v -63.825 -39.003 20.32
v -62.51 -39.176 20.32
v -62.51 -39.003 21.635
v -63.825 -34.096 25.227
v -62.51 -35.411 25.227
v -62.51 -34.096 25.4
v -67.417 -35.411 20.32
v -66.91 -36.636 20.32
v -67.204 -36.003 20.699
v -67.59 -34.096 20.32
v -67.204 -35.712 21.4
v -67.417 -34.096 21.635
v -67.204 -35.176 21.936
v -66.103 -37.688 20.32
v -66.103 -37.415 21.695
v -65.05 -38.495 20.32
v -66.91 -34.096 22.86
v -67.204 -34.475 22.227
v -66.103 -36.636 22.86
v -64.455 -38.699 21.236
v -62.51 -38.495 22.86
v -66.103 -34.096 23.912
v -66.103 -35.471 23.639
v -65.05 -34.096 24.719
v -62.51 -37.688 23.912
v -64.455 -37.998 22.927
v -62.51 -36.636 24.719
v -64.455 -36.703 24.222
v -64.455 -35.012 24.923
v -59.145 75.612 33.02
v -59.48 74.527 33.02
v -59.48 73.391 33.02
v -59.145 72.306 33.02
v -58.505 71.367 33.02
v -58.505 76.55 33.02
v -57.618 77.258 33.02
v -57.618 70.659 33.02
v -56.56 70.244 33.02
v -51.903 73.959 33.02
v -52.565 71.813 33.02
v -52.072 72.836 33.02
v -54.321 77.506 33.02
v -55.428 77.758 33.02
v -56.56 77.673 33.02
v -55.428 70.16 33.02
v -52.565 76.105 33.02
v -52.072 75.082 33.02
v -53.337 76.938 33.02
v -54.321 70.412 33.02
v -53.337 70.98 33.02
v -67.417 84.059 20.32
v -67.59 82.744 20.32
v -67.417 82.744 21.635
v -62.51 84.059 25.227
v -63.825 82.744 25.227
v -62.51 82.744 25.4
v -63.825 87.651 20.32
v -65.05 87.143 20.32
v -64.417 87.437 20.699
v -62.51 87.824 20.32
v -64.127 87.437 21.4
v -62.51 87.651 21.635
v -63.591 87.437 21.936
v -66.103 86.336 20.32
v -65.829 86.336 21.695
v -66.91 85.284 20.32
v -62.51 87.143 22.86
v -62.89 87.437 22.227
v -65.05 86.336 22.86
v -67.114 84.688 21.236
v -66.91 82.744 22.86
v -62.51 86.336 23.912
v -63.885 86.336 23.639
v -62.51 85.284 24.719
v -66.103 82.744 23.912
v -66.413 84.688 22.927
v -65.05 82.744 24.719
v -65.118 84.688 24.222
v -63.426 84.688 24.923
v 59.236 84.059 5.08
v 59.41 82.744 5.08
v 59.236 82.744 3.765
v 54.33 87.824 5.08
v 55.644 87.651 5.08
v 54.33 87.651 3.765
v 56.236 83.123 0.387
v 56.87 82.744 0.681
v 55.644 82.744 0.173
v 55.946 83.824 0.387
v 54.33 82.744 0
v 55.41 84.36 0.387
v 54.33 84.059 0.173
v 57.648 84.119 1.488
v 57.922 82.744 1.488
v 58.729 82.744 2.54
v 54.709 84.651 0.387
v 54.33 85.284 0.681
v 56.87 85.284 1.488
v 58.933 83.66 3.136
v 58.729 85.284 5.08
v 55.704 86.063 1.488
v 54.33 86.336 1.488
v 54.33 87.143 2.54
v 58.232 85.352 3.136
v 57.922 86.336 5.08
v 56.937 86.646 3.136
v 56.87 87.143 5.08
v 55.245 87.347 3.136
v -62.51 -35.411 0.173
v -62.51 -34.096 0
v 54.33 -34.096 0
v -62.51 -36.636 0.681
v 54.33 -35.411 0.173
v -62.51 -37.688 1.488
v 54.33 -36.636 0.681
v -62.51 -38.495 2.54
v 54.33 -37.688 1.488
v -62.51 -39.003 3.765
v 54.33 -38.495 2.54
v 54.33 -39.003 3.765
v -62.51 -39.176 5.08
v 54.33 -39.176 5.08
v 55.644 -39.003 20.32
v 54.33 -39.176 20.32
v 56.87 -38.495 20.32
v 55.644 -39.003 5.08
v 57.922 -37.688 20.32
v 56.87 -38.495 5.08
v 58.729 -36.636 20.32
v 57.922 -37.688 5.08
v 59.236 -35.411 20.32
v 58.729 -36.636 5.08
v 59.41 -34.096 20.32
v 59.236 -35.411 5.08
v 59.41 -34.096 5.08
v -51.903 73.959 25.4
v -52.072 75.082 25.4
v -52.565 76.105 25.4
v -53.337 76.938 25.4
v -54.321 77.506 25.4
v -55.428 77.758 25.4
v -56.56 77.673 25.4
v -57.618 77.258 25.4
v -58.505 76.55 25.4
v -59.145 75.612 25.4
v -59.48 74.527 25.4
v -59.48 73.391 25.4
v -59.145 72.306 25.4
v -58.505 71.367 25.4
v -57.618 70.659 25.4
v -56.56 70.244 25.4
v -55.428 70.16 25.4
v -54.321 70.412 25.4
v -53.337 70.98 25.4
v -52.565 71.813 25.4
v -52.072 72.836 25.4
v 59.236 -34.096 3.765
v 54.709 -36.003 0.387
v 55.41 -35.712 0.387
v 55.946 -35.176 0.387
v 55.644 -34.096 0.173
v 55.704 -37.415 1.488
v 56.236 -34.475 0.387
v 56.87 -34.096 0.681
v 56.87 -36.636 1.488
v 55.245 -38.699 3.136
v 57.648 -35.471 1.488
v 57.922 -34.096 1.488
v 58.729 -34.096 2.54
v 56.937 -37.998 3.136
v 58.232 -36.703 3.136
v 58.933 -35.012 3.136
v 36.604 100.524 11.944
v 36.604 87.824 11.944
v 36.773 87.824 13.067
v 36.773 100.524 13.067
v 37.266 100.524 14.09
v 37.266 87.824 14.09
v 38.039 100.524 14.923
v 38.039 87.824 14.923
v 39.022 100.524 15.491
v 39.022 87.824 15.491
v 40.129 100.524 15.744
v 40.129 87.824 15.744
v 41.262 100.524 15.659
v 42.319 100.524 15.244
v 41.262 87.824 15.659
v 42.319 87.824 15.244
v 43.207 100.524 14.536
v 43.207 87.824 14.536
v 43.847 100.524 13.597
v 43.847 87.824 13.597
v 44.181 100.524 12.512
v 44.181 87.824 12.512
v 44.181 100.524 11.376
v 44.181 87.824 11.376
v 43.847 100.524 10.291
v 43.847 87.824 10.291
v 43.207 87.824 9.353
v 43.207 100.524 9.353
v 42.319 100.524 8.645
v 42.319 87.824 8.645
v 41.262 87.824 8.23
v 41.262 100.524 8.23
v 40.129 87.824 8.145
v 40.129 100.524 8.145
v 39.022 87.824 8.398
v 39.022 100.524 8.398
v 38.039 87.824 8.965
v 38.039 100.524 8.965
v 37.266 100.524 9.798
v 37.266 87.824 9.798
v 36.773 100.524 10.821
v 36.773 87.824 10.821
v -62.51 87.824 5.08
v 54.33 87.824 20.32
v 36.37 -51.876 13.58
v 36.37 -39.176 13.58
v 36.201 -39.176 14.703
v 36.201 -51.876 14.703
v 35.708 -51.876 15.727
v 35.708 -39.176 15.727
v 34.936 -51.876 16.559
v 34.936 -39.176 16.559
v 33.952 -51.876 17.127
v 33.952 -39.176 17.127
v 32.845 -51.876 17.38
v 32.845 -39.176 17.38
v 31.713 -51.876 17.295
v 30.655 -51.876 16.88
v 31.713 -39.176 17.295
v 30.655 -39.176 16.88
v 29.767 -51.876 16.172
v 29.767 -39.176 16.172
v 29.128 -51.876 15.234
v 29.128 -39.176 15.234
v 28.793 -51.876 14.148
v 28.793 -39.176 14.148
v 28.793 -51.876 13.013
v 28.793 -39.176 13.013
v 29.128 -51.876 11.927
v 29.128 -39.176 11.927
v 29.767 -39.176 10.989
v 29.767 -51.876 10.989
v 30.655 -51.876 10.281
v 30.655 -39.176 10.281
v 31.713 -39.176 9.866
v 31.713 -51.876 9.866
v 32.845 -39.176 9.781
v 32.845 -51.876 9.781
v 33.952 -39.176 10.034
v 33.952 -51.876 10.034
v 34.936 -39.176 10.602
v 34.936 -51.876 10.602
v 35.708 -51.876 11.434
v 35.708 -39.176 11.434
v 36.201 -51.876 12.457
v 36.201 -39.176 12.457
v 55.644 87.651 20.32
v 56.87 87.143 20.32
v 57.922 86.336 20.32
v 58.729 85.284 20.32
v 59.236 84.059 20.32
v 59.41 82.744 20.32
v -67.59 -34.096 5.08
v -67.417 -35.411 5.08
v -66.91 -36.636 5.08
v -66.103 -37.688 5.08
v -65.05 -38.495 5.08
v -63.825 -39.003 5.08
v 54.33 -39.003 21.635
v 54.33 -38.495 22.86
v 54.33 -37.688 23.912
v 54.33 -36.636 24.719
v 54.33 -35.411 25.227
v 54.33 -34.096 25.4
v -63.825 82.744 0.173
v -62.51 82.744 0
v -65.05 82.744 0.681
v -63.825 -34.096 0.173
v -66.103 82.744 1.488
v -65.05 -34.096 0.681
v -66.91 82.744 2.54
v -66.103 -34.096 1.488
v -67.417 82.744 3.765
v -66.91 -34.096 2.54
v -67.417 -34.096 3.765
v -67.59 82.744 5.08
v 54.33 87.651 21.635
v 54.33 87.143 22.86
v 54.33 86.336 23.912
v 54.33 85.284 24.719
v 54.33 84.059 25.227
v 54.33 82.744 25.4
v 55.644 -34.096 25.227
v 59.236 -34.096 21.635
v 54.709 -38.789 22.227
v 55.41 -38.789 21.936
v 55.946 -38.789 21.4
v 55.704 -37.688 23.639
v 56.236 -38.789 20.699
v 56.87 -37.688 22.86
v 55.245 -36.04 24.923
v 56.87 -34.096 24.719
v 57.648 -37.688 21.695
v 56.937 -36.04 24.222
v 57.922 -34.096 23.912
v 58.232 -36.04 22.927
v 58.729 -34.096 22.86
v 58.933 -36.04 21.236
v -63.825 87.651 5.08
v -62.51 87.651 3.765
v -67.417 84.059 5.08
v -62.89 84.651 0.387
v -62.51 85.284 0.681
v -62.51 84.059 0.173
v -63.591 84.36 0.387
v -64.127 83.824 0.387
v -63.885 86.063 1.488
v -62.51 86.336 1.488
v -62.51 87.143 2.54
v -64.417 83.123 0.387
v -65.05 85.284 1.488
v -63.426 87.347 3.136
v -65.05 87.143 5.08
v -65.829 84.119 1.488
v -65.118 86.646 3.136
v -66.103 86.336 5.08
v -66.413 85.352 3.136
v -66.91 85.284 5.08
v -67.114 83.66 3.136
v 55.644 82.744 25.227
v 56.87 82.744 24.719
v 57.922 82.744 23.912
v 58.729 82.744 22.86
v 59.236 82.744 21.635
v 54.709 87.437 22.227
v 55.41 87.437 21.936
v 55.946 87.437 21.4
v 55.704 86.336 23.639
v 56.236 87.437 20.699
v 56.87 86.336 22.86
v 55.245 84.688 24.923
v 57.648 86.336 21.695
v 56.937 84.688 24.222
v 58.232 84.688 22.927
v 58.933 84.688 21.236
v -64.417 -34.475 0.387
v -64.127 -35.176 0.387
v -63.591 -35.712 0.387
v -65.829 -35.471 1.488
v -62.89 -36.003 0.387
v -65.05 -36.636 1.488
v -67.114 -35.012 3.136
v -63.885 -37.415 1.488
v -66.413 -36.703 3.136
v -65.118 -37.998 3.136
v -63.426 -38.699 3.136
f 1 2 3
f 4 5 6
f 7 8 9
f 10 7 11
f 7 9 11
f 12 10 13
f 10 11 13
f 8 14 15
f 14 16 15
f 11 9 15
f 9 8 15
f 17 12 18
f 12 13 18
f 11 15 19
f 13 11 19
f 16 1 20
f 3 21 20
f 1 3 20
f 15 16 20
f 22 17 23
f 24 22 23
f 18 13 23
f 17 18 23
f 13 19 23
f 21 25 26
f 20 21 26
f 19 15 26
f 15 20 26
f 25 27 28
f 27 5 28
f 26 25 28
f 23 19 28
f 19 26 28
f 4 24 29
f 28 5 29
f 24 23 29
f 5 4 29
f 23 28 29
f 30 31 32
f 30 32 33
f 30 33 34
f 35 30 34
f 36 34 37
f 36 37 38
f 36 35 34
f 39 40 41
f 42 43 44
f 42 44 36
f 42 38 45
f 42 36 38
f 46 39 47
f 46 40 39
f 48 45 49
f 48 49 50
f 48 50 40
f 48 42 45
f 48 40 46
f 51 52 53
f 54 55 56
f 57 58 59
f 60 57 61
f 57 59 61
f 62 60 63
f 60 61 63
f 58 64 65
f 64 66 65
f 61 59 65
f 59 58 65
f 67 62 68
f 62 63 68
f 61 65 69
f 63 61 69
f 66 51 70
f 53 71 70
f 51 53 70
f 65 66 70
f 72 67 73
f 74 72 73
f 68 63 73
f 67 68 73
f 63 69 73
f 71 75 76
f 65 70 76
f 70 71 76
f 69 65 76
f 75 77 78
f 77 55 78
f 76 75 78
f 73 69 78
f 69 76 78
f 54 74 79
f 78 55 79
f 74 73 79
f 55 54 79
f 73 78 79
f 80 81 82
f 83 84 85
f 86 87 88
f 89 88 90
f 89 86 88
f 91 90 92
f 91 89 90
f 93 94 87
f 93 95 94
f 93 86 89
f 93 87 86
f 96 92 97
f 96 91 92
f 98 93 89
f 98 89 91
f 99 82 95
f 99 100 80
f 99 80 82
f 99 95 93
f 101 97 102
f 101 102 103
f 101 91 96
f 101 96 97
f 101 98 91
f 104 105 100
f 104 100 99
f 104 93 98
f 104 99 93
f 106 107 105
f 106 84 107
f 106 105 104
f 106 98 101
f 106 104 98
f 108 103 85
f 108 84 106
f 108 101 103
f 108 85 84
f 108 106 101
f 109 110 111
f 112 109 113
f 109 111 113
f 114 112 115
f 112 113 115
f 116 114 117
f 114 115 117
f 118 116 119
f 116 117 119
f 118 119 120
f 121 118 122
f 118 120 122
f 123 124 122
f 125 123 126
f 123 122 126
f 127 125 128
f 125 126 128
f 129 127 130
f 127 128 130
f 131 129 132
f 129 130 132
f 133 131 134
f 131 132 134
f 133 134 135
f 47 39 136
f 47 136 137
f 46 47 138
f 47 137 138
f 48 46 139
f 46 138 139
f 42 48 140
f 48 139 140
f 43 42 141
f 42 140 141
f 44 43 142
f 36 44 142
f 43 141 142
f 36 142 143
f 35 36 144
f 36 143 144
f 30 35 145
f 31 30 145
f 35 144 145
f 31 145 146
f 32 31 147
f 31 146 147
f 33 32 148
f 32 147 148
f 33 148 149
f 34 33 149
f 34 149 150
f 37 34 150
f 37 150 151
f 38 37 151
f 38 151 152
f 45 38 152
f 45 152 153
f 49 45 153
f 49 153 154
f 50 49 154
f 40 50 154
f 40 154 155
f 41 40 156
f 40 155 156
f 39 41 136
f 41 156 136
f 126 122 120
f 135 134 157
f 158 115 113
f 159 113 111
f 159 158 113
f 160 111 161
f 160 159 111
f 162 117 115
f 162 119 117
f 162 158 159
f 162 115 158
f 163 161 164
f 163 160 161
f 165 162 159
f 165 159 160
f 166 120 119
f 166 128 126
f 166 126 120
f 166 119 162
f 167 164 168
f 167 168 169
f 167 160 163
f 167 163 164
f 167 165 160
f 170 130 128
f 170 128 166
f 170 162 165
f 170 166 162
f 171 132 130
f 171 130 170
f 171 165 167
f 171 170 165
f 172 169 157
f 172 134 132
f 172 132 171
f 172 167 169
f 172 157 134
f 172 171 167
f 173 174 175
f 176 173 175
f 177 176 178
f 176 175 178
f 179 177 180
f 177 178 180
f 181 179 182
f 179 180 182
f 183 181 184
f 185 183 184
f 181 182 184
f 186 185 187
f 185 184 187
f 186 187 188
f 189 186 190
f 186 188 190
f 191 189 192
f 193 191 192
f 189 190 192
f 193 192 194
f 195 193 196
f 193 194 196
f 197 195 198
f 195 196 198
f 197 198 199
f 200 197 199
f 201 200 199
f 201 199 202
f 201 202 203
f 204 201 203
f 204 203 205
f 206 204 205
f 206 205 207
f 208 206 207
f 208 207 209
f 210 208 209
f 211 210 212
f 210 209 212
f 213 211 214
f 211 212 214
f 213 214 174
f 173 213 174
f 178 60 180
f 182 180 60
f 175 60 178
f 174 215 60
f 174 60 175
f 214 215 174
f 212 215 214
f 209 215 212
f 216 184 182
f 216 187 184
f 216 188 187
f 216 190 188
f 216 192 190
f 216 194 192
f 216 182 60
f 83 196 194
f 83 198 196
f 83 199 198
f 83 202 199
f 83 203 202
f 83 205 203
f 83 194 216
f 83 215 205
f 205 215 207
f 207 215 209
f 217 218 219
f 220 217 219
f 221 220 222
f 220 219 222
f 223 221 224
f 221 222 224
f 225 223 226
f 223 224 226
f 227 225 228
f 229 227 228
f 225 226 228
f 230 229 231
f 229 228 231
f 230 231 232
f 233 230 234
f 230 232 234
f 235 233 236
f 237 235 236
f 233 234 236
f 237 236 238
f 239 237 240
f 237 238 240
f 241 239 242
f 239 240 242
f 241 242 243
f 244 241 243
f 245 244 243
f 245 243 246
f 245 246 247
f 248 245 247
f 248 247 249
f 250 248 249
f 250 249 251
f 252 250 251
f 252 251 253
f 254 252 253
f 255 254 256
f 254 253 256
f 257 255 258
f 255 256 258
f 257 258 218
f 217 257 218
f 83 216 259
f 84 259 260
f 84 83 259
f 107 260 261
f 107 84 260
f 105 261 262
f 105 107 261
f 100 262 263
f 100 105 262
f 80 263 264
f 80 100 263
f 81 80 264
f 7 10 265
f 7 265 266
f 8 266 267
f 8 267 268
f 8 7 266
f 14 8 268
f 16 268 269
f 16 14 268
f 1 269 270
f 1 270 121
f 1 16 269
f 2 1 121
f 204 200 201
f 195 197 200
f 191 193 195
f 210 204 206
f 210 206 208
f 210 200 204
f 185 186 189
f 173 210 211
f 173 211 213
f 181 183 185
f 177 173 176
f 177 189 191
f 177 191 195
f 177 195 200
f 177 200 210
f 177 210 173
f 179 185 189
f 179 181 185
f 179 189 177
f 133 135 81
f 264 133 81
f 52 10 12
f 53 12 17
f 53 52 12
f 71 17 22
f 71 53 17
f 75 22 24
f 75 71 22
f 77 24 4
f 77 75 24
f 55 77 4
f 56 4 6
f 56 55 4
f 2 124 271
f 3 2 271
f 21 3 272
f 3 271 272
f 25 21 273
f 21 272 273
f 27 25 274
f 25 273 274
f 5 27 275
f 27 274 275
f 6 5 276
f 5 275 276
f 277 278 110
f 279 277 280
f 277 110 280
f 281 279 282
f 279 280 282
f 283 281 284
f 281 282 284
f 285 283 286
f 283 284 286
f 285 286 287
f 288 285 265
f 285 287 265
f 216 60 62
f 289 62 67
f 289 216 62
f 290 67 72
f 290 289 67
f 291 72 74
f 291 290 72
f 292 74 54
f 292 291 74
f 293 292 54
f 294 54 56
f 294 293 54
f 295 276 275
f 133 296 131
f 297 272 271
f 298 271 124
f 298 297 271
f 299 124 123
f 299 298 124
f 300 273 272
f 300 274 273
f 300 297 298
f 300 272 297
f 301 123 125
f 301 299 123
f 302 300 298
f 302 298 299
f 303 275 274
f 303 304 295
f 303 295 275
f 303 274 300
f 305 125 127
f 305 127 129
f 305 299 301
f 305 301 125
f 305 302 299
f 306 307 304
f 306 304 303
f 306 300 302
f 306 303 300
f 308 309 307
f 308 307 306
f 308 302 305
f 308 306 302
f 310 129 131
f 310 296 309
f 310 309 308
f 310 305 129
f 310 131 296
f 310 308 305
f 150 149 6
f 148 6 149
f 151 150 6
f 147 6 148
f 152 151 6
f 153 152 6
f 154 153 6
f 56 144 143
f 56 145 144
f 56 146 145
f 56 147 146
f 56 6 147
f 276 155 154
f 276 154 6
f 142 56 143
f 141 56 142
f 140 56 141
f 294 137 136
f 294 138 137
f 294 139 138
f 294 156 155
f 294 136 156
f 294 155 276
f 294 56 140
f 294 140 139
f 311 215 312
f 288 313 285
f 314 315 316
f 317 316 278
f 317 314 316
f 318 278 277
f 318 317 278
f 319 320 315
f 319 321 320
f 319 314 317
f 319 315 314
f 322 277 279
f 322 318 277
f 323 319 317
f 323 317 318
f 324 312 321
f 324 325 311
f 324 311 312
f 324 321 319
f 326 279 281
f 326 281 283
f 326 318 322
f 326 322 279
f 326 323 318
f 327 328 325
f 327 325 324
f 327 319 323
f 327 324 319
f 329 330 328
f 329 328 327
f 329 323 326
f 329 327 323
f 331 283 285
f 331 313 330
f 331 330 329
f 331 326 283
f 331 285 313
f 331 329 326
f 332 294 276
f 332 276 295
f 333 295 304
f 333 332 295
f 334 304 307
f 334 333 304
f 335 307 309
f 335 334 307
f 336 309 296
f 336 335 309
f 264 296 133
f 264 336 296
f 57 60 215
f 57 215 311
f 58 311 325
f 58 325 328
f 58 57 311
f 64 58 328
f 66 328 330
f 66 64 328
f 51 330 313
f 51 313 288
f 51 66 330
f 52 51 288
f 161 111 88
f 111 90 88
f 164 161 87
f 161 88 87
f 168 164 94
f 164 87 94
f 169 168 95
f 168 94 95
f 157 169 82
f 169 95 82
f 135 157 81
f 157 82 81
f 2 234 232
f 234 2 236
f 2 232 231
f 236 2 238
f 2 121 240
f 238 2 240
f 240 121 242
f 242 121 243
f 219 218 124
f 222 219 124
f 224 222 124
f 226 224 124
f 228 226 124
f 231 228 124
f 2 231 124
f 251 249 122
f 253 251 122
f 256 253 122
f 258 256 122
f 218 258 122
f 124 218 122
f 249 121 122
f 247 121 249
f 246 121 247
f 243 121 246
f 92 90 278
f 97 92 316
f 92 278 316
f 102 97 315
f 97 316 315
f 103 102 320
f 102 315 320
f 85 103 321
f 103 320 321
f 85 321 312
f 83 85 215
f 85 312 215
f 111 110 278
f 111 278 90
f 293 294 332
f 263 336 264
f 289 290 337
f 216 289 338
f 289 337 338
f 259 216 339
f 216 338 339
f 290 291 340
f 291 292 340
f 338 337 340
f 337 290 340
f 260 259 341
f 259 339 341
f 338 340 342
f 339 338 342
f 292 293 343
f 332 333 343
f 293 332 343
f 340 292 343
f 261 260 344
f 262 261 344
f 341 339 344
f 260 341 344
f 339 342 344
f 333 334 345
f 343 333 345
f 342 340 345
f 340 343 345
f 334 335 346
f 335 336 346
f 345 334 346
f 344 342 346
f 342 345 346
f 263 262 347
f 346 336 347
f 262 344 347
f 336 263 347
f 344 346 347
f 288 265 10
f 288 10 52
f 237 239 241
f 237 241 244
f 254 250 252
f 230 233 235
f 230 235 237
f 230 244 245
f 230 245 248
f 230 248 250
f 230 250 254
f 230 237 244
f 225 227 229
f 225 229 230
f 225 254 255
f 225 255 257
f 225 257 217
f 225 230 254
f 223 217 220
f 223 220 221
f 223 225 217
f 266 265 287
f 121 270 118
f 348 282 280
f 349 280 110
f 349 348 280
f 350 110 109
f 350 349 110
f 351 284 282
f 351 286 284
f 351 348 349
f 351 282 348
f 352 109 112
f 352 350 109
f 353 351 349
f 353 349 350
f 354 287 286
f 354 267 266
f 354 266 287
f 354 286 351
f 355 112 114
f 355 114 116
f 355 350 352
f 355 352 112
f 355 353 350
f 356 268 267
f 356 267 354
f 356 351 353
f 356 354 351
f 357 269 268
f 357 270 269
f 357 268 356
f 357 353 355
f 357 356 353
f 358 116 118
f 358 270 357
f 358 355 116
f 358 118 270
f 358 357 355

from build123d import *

# Parameters (mm, degrees)
F0_W      = 127
F0_H      = 127
F1_DEPTH  = 25.4
F2_R      = 3.81
F3_DEPTH  = 7.62
F4_R      = 5.08
F5_R      = 5.08
F6_R      = 5.08
F7_R      = 5.08
F8_R      = 5.08
F9_R      = 3.81
F10_DEPTH = 12.7
F11_R     = 3.81
F12_DEPTH = 12.7


with BuildPart() as f1:
    # F0 (on Top) → F1 (new body)
    with BuildSketch(Plane.XY):
        with Locations((-4.09049, 24.324038)):
            Rectangle(F0_W, F0_H)
    extrude(amount=F1_DEPTH)

    # F2 (on face) → F3 (join)
    with BuildSketch(Plane.XY.offset(25.4)):
        with Locations((-55.712551, 73.958889)):
            Circle(F2_R)
    extrude(amount=F3_DEPTH)

    # F4
    f4_edges = [f1.edges().sort_by_distance(p)[0] for p in [
        (59.40951, 24.324038, 25.4),
    ]]
    fillet(f4_edges, radius=F4_R)

    # F5
    f5_edges = [f1.edges().sort_by_distance(p)[0] for p in [
        (-6.63049, -39.175962, 25.4),
    ]]
    fillet(f5_edges, radius=F5_R)

    # F6
    f6_edges = [f1.edges().sort_by_distance(p)[0] for p in [
        (-67.59049, 26.864038, 25.4),
    ]]
    fillet(f6_edges, radius=F6_R)

    # F7
    f7_edges = [f1.edges().sort_by_distance(p)[0] for p in [
        (-4.09049, 87.824038, 25.4),
    ]]
    fillet(f7_edges, radius=F7_R)

    # F8
    f8_edges = [f1.edges().sort_by_distance(p)[0] for p in [
        (59.40951, 24.324038, 0),
    ]]
    fillet(f8_edges, radius=F8_R)

    # F9 (on face) → F10 (join)
    with BuildSketch(Plane.XZ.offset(39.175962)):
        with Locations((32.560311, 13.580429)):
            Circle(F9_R)
    extrude(amount=F10_DEPTH)

    # F11 (on face) → F12 (join)
    with BuildSketch(Plane(origin=(0, 87.824038, 0), x_dir=(-1, 0, 0), z_dir=(0, 1, 0))):
        with Locations((-40.414046, 11.944233)):
            Circle(F11_R)
    extrude(amount=F12_DEPTH)


solid = f1.part
